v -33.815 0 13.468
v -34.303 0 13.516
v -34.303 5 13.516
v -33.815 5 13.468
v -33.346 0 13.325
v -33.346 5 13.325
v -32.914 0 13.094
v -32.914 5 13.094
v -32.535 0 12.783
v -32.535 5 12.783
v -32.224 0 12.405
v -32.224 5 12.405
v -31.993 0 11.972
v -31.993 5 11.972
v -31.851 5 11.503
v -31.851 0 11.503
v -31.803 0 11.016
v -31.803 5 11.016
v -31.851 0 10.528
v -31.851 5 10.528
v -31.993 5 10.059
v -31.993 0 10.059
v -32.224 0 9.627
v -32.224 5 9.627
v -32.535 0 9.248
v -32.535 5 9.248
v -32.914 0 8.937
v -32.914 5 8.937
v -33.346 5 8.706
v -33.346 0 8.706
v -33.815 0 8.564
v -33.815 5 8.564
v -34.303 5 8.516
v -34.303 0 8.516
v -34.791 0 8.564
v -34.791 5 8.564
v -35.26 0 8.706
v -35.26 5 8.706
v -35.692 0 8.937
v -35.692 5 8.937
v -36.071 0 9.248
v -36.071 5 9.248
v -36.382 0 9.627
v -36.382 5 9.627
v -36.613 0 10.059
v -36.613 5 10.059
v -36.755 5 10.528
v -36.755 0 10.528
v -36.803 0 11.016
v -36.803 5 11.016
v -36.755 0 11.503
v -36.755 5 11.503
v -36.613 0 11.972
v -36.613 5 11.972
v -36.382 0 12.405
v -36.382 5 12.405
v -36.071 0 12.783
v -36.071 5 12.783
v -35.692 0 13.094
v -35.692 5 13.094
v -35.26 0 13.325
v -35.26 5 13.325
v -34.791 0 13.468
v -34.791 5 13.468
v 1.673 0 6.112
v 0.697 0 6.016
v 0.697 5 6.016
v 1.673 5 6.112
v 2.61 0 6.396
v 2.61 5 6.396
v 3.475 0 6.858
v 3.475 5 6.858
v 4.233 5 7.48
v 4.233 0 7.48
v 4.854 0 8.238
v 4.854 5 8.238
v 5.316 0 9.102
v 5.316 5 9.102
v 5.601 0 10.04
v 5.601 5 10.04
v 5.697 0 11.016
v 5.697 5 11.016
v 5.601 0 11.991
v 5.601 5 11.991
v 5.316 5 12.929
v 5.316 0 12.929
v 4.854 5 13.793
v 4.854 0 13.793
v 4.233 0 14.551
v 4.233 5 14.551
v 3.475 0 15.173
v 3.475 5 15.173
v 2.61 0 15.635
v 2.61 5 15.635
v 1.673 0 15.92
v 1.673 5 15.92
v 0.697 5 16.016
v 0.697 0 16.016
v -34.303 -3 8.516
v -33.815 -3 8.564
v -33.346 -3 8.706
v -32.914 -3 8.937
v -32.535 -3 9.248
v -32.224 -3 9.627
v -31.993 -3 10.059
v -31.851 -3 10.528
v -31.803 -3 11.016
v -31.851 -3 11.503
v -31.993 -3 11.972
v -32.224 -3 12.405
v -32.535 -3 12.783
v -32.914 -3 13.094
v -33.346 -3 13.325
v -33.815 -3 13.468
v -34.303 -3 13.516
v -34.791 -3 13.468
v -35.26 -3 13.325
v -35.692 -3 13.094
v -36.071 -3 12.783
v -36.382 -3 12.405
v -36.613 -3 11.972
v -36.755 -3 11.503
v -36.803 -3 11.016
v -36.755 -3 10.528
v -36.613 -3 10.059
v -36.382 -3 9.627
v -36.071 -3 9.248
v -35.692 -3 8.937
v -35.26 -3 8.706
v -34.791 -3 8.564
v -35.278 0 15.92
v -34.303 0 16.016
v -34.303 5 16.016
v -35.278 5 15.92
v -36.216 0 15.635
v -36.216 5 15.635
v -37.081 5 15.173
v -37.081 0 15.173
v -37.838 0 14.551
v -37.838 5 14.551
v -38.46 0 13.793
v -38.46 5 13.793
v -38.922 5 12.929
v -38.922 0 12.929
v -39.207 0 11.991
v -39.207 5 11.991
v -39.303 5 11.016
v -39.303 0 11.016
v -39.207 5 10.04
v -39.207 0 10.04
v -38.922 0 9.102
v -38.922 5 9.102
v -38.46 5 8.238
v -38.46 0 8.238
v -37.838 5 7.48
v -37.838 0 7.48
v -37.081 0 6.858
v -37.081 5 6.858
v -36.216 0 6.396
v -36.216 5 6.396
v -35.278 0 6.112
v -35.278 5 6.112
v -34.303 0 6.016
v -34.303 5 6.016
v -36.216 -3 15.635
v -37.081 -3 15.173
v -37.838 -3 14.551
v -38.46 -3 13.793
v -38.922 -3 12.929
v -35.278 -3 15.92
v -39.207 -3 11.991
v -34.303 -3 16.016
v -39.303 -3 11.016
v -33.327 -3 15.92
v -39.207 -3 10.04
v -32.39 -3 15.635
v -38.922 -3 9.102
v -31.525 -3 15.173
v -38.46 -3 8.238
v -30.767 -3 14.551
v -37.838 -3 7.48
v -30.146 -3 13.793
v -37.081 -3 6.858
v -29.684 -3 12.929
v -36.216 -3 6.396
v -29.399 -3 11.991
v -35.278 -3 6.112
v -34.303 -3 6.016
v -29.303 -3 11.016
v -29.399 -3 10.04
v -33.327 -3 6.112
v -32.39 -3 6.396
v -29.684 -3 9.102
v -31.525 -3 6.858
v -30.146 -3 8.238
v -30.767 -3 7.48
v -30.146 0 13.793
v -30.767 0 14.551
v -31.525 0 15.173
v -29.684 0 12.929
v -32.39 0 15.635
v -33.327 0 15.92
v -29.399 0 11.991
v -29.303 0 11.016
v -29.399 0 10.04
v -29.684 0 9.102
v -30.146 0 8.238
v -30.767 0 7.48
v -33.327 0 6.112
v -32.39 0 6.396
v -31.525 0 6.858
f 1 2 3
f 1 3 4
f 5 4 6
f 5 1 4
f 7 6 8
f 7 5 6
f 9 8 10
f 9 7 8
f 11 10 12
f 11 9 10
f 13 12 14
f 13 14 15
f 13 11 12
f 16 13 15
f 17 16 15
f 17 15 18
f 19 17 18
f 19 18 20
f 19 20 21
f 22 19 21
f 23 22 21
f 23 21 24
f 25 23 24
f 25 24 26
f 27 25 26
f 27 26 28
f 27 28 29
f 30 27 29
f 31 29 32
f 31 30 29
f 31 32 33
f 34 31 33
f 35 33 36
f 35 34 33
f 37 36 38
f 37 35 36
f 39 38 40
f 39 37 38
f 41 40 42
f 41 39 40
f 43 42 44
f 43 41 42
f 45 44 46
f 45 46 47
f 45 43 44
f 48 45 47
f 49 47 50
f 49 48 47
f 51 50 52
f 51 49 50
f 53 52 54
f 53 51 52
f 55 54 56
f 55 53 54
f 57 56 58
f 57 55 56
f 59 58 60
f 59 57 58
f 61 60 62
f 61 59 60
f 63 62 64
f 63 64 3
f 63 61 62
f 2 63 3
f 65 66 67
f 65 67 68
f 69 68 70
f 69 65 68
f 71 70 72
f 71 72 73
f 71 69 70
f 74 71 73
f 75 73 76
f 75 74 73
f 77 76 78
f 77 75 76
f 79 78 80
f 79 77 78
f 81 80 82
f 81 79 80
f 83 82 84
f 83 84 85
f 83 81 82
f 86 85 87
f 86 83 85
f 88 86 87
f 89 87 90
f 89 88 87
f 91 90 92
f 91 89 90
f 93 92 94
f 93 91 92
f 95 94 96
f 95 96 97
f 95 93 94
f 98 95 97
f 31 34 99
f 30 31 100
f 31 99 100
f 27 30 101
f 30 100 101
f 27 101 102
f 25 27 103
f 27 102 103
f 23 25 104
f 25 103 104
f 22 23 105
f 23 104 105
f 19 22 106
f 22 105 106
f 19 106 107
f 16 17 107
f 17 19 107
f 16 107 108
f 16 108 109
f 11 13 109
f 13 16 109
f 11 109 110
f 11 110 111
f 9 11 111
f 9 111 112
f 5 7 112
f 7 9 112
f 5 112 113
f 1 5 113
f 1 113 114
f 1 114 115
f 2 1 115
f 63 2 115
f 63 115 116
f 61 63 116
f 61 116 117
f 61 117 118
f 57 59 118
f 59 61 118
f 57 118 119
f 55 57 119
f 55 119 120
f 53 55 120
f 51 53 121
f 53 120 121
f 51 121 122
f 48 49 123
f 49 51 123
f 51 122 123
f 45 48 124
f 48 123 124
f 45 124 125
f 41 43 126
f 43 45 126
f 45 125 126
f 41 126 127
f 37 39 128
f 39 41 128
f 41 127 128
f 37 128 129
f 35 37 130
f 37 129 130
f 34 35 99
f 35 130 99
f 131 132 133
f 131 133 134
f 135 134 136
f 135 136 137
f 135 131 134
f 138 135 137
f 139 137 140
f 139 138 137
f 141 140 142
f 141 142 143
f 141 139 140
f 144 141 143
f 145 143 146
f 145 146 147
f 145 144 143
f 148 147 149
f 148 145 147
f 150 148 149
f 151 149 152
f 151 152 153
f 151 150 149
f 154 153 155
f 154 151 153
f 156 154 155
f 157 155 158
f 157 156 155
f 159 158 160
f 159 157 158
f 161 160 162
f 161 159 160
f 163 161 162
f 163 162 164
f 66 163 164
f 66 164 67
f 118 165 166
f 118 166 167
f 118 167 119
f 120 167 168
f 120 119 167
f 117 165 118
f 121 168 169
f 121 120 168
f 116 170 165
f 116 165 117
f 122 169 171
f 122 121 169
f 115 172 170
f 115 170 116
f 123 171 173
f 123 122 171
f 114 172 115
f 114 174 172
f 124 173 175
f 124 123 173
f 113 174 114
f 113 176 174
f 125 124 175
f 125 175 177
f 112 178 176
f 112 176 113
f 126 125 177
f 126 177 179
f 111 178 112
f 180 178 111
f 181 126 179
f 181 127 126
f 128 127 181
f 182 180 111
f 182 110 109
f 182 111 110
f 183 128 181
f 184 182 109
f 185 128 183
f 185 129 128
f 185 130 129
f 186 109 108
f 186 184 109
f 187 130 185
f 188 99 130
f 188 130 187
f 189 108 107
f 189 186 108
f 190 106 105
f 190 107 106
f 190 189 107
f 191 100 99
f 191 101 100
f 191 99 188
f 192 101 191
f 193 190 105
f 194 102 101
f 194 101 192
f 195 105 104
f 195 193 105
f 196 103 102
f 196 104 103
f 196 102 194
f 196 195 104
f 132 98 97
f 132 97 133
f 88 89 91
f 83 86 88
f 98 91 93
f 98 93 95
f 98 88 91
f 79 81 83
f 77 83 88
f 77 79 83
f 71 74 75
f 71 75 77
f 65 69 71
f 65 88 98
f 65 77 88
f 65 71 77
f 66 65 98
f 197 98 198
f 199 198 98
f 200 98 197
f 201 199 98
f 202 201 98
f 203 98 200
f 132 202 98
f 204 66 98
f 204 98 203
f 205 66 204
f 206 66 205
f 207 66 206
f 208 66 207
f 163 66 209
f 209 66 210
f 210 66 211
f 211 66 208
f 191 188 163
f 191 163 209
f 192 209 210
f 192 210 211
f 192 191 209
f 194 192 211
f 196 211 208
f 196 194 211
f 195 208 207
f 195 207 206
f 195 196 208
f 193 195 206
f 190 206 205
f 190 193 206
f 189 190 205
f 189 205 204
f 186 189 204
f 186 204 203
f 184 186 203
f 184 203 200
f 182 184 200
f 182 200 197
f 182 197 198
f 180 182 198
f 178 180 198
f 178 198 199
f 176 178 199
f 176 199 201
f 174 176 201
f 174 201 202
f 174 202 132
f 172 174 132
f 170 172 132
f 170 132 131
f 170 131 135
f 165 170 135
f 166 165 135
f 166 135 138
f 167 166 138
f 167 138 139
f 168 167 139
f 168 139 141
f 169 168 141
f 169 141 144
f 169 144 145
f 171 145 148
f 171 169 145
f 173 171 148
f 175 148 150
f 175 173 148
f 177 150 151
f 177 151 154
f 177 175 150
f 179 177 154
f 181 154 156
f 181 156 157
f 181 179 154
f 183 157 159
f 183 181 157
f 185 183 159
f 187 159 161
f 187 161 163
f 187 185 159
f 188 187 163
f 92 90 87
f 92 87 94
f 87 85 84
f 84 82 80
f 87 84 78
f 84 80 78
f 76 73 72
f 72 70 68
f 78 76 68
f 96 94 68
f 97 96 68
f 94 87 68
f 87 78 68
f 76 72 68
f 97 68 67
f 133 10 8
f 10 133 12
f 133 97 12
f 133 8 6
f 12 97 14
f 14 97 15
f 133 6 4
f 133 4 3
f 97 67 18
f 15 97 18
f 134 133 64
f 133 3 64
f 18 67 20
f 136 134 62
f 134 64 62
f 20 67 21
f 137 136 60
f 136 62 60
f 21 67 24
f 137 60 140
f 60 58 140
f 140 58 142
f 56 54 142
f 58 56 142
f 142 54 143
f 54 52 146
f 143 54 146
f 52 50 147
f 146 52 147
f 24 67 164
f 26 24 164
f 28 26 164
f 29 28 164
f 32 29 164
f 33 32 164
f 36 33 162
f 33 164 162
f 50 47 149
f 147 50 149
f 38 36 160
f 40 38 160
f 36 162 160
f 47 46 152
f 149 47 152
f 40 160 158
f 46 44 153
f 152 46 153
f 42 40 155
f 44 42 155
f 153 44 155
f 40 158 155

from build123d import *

# Parameters (mm, degrees)
SKETCH_1_R      = 2.5
EXTRUDE_1_DEPTH = 5
EXTRUDE_START   = 3
SKETCH_2_R      = 5
SKETCH_2_R_2    = 2.5
EXTRUDE_2_DEPTH = 3


with BuildPart() as part:
    # 草图1 → 凸台-拉伸1 (new body)
    with BuildSketch(Plane(origin=(0, 0, 0), x_dir=(1, 0, 0), z_dir=(0, 1, 0))):
        with BuildLine():
            Line((-34.30294509, -6.015613436), (0.69705491, -6.015613436))
            ThreePointArc((0.69705491, -6.015613436), (5.69705491, -11.015613436), (0.69705491, -16.015613436))
            Line((0.69705491, -16.015613436), (-34.30294509, -16.015613436))
            ThreePointArc((-34.30294509, -16.015613436), (-39.30294509, -11.015613436), (-34.30294509, -6.015613436))
        make_face()
        with Locations(Location((-34.30294509, -11.015613436, 0), (0, 0, 270))):
            Circle(SKETCH_1_R, mode=Mode.SUBTRACT)
    extrude(amount=EXTRUDE_1_DEPTH)

    # 草图2 → 凸台-拉伸2 (add)
    with BuildSketch(Plane.XZ.offset(EXTRUDE_START)):
        with Locations(Location((-34.30294509, 11.015613436, 0), (0, 0, 270))):
            Circle(SKETCH_2_R)
        with Locations(Location((-34.30294509, 11.015613436, 0), (0, 0, 270))):
            Circle(SKETCH_2_R_2, mode=Mode.SUBTRACT)
    extrude(amount=-EXTRUDE_2_DEPTH)


solid = part.part
